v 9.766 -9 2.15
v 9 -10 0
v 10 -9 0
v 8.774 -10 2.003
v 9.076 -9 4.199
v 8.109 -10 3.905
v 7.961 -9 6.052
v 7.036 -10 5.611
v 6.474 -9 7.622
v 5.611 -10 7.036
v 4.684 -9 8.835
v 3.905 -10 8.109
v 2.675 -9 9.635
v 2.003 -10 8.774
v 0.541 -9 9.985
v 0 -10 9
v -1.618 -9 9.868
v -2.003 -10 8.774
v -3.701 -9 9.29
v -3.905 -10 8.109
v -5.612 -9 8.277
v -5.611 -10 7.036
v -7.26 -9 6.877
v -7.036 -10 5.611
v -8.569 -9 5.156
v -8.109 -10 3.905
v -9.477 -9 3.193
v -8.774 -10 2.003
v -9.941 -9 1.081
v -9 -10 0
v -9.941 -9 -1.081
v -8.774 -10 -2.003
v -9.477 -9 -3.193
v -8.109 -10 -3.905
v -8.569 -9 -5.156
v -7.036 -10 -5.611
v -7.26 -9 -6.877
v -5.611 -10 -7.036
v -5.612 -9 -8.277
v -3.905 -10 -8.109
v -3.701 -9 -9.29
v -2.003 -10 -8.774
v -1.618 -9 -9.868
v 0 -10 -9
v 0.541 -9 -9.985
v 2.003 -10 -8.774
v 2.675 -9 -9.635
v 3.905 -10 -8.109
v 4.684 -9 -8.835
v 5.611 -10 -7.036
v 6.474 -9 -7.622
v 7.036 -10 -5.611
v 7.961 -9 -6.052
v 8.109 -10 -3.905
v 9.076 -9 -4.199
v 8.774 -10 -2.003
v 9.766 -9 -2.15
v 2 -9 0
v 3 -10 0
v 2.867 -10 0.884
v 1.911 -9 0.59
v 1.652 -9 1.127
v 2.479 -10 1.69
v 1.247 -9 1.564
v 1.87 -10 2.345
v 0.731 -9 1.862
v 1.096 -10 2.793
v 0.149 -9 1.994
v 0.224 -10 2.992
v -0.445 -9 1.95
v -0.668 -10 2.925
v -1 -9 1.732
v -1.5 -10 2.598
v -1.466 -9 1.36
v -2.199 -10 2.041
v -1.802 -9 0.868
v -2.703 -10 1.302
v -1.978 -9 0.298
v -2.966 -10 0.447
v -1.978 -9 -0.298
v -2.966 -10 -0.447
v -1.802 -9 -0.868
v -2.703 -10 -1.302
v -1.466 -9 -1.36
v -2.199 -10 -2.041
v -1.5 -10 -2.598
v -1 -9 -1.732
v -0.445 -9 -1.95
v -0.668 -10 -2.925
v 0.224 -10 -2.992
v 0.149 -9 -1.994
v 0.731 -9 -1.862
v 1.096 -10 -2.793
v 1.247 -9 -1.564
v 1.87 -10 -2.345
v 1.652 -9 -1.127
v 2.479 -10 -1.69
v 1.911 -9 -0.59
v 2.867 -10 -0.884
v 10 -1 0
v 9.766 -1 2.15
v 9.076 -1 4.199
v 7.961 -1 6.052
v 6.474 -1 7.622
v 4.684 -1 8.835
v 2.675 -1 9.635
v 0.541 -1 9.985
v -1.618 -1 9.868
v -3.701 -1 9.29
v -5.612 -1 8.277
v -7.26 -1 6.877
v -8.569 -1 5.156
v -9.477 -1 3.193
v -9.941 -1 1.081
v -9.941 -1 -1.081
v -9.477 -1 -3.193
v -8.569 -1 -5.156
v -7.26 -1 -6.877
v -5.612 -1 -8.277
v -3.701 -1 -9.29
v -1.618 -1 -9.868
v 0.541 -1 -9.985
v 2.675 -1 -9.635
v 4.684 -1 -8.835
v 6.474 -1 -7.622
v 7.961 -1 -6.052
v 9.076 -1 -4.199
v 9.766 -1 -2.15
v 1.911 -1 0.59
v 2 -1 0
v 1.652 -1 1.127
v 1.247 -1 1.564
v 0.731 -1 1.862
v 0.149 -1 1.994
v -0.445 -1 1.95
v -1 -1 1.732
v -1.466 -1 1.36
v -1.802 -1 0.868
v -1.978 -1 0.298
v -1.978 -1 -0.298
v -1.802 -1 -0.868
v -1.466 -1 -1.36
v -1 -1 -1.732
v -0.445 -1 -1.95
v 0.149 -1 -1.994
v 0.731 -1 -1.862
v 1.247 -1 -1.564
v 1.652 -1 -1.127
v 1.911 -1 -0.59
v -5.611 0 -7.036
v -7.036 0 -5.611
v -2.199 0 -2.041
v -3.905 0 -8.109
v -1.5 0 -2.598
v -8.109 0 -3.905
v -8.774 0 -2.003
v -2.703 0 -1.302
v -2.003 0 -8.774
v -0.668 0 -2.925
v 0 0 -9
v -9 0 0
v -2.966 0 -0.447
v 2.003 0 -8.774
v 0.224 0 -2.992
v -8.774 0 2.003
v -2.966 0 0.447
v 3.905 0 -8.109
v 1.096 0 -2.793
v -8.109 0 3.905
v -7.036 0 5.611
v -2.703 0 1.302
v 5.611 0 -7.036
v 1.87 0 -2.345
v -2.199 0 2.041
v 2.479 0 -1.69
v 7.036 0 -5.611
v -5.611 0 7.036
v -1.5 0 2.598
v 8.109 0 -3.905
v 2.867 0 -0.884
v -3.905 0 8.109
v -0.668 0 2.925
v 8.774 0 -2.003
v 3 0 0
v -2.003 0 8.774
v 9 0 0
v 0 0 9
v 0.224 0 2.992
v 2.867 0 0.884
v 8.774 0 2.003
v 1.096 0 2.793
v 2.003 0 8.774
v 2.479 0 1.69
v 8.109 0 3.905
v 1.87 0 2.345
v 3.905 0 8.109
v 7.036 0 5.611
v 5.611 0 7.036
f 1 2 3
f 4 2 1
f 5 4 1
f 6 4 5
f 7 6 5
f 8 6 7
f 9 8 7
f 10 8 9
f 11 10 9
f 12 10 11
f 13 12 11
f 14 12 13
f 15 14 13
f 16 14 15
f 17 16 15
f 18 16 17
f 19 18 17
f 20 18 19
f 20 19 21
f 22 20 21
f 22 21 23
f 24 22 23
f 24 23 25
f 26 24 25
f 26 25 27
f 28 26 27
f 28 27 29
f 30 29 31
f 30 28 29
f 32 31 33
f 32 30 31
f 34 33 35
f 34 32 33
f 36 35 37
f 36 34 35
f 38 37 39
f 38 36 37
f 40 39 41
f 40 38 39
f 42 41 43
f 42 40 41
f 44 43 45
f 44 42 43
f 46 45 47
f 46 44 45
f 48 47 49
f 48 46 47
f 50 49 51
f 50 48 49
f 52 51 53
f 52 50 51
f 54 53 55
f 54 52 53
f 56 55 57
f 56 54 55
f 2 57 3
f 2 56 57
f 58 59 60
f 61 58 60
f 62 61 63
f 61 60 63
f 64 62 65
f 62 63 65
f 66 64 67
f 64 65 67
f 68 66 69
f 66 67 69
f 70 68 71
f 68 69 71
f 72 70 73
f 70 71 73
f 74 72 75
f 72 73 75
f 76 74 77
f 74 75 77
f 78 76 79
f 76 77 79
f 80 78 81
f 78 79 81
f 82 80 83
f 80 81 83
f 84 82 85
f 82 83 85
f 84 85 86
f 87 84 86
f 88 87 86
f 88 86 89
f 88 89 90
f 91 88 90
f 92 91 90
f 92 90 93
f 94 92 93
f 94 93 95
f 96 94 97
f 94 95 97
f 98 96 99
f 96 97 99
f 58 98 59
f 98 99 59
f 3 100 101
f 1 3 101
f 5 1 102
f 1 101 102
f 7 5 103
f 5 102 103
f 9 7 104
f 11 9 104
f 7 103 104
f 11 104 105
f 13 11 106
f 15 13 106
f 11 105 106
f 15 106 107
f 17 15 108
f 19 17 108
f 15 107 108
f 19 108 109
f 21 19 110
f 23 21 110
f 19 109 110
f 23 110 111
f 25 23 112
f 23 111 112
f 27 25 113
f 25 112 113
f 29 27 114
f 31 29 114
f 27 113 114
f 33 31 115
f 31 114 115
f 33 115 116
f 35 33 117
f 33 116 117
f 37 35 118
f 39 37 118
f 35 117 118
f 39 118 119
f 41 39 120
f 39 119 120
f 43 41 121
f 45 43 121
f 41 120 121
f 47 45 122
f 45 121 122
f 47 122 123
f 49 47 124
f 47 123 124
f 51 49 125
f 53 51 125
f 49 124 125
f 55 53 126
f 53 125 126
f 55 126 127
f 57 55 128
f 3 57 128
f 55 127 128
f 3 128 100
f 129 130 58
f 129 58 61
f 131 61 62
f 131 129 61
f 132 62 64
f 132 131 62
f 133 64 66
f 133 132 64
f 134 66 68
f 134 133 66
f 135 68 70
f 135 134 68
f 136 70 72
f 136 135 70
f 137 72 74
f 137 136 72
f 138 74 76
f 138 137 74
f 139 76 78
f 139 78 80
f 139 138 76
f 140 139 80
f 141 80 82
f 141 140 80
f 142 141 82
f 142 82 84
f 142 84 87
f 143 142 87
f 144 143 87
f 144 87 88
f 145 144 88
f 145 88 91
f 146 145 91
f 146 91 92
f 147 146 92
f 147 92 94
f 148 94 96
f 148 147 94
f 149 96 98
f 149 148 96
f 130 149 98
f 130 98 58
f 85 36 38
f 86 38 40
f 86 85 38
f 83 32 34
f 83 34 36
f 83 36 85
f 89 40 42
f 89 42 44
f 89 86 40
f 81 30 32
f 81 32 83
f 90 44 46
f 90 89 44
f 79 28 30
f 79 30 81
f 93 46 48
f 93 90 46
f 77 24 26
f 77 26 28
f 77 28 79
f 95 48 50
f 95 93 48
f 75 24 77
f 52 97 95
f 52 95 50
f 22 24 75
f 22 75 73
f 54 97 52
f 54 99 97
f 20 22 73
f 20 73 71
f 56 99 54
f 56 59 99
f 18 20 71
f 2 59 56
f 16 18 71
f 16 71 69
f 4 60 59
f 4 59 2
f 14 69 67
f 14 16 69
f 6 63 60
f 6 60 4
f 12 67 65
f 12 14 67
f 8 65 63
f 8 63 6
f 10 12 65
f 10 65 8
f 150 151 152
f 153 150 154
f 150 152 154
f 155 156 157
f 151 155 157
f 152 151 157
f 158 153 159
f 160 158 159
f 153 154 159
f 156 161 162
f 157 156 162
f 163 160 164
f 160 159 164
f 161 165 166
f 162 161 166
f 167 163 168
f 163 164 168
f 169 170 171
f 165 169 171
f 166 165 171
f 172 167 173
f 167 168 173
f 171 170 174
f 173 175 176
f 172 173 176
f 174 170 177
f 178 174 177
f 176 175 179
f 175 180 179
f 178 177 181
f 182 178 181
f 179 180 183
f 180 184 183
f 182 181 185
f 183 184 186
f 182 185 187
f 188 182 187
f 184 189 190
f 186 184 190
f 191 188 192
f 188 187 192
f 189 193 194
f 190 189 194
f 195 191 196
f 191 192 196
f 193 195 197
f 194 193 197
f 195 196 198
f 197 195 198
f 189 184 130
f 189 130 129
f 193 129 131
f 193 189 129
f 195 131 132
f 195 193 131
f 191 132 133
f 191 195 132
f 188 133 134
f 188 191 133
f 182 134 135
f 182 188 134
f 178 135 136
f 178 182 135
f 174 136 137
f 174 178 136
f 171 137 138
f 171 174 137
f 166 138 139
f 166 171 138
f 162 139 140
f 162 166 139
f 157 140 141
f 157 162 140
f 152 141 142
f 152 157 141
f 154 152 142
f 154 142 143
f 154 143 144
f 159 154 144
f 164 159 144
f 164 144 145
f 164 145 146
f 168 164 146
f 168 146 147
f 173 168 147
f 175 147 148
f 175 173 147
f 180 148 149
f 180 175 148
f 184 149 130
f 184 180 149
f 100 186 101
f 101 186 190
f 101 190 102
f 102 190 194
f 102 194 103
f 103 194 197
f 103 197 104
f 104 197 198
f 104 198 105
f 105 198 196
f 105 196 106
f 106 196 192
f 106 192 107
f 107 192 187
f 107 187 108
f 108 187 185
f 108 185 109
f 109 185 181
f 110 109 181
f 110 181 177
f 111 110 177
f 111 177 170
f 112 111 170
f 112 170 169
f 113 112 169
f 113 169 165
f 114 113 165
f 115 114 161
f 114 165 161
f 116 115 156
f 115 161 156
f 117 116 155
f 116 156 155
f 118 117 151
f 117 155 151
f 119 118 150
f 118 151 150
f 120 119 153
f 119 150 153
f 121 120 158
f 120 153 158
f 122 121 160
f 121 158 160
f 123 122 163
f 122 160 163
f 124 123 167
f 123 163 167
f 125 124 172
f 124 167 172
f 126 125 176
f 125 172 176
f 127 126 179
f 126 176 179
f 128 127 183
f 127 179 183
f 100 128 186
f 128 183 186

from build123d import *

# Parameters (mm, degrees)
SKETCH_R     = 10
SKETCH_R_2   = 2
PAD_DEPTH    = 10
CHAMFER_SIZE = 1


with BuildPart() as part:
    # Sketch → Pad (new body)
    with BuildSketch(Plane.XZ):
        Circle(SKETCH_R)
        Circle(SKETCH_R_2, mode=Mode.SUBTRACT)
    extrude(amount=PAD_DEPTH)

    # Chamfer
    chamfer_edges = [part.edges().sort_by_distance(p)[0] for p in [
        (-2, -10, 0),
        (-2, 0, 0),
        (-10, -10, 0),
        (-10, 0, 0),
    ]]
    chamfer(chamfer_edges, length=CHAMFER_SIZE)


solid = part.part
